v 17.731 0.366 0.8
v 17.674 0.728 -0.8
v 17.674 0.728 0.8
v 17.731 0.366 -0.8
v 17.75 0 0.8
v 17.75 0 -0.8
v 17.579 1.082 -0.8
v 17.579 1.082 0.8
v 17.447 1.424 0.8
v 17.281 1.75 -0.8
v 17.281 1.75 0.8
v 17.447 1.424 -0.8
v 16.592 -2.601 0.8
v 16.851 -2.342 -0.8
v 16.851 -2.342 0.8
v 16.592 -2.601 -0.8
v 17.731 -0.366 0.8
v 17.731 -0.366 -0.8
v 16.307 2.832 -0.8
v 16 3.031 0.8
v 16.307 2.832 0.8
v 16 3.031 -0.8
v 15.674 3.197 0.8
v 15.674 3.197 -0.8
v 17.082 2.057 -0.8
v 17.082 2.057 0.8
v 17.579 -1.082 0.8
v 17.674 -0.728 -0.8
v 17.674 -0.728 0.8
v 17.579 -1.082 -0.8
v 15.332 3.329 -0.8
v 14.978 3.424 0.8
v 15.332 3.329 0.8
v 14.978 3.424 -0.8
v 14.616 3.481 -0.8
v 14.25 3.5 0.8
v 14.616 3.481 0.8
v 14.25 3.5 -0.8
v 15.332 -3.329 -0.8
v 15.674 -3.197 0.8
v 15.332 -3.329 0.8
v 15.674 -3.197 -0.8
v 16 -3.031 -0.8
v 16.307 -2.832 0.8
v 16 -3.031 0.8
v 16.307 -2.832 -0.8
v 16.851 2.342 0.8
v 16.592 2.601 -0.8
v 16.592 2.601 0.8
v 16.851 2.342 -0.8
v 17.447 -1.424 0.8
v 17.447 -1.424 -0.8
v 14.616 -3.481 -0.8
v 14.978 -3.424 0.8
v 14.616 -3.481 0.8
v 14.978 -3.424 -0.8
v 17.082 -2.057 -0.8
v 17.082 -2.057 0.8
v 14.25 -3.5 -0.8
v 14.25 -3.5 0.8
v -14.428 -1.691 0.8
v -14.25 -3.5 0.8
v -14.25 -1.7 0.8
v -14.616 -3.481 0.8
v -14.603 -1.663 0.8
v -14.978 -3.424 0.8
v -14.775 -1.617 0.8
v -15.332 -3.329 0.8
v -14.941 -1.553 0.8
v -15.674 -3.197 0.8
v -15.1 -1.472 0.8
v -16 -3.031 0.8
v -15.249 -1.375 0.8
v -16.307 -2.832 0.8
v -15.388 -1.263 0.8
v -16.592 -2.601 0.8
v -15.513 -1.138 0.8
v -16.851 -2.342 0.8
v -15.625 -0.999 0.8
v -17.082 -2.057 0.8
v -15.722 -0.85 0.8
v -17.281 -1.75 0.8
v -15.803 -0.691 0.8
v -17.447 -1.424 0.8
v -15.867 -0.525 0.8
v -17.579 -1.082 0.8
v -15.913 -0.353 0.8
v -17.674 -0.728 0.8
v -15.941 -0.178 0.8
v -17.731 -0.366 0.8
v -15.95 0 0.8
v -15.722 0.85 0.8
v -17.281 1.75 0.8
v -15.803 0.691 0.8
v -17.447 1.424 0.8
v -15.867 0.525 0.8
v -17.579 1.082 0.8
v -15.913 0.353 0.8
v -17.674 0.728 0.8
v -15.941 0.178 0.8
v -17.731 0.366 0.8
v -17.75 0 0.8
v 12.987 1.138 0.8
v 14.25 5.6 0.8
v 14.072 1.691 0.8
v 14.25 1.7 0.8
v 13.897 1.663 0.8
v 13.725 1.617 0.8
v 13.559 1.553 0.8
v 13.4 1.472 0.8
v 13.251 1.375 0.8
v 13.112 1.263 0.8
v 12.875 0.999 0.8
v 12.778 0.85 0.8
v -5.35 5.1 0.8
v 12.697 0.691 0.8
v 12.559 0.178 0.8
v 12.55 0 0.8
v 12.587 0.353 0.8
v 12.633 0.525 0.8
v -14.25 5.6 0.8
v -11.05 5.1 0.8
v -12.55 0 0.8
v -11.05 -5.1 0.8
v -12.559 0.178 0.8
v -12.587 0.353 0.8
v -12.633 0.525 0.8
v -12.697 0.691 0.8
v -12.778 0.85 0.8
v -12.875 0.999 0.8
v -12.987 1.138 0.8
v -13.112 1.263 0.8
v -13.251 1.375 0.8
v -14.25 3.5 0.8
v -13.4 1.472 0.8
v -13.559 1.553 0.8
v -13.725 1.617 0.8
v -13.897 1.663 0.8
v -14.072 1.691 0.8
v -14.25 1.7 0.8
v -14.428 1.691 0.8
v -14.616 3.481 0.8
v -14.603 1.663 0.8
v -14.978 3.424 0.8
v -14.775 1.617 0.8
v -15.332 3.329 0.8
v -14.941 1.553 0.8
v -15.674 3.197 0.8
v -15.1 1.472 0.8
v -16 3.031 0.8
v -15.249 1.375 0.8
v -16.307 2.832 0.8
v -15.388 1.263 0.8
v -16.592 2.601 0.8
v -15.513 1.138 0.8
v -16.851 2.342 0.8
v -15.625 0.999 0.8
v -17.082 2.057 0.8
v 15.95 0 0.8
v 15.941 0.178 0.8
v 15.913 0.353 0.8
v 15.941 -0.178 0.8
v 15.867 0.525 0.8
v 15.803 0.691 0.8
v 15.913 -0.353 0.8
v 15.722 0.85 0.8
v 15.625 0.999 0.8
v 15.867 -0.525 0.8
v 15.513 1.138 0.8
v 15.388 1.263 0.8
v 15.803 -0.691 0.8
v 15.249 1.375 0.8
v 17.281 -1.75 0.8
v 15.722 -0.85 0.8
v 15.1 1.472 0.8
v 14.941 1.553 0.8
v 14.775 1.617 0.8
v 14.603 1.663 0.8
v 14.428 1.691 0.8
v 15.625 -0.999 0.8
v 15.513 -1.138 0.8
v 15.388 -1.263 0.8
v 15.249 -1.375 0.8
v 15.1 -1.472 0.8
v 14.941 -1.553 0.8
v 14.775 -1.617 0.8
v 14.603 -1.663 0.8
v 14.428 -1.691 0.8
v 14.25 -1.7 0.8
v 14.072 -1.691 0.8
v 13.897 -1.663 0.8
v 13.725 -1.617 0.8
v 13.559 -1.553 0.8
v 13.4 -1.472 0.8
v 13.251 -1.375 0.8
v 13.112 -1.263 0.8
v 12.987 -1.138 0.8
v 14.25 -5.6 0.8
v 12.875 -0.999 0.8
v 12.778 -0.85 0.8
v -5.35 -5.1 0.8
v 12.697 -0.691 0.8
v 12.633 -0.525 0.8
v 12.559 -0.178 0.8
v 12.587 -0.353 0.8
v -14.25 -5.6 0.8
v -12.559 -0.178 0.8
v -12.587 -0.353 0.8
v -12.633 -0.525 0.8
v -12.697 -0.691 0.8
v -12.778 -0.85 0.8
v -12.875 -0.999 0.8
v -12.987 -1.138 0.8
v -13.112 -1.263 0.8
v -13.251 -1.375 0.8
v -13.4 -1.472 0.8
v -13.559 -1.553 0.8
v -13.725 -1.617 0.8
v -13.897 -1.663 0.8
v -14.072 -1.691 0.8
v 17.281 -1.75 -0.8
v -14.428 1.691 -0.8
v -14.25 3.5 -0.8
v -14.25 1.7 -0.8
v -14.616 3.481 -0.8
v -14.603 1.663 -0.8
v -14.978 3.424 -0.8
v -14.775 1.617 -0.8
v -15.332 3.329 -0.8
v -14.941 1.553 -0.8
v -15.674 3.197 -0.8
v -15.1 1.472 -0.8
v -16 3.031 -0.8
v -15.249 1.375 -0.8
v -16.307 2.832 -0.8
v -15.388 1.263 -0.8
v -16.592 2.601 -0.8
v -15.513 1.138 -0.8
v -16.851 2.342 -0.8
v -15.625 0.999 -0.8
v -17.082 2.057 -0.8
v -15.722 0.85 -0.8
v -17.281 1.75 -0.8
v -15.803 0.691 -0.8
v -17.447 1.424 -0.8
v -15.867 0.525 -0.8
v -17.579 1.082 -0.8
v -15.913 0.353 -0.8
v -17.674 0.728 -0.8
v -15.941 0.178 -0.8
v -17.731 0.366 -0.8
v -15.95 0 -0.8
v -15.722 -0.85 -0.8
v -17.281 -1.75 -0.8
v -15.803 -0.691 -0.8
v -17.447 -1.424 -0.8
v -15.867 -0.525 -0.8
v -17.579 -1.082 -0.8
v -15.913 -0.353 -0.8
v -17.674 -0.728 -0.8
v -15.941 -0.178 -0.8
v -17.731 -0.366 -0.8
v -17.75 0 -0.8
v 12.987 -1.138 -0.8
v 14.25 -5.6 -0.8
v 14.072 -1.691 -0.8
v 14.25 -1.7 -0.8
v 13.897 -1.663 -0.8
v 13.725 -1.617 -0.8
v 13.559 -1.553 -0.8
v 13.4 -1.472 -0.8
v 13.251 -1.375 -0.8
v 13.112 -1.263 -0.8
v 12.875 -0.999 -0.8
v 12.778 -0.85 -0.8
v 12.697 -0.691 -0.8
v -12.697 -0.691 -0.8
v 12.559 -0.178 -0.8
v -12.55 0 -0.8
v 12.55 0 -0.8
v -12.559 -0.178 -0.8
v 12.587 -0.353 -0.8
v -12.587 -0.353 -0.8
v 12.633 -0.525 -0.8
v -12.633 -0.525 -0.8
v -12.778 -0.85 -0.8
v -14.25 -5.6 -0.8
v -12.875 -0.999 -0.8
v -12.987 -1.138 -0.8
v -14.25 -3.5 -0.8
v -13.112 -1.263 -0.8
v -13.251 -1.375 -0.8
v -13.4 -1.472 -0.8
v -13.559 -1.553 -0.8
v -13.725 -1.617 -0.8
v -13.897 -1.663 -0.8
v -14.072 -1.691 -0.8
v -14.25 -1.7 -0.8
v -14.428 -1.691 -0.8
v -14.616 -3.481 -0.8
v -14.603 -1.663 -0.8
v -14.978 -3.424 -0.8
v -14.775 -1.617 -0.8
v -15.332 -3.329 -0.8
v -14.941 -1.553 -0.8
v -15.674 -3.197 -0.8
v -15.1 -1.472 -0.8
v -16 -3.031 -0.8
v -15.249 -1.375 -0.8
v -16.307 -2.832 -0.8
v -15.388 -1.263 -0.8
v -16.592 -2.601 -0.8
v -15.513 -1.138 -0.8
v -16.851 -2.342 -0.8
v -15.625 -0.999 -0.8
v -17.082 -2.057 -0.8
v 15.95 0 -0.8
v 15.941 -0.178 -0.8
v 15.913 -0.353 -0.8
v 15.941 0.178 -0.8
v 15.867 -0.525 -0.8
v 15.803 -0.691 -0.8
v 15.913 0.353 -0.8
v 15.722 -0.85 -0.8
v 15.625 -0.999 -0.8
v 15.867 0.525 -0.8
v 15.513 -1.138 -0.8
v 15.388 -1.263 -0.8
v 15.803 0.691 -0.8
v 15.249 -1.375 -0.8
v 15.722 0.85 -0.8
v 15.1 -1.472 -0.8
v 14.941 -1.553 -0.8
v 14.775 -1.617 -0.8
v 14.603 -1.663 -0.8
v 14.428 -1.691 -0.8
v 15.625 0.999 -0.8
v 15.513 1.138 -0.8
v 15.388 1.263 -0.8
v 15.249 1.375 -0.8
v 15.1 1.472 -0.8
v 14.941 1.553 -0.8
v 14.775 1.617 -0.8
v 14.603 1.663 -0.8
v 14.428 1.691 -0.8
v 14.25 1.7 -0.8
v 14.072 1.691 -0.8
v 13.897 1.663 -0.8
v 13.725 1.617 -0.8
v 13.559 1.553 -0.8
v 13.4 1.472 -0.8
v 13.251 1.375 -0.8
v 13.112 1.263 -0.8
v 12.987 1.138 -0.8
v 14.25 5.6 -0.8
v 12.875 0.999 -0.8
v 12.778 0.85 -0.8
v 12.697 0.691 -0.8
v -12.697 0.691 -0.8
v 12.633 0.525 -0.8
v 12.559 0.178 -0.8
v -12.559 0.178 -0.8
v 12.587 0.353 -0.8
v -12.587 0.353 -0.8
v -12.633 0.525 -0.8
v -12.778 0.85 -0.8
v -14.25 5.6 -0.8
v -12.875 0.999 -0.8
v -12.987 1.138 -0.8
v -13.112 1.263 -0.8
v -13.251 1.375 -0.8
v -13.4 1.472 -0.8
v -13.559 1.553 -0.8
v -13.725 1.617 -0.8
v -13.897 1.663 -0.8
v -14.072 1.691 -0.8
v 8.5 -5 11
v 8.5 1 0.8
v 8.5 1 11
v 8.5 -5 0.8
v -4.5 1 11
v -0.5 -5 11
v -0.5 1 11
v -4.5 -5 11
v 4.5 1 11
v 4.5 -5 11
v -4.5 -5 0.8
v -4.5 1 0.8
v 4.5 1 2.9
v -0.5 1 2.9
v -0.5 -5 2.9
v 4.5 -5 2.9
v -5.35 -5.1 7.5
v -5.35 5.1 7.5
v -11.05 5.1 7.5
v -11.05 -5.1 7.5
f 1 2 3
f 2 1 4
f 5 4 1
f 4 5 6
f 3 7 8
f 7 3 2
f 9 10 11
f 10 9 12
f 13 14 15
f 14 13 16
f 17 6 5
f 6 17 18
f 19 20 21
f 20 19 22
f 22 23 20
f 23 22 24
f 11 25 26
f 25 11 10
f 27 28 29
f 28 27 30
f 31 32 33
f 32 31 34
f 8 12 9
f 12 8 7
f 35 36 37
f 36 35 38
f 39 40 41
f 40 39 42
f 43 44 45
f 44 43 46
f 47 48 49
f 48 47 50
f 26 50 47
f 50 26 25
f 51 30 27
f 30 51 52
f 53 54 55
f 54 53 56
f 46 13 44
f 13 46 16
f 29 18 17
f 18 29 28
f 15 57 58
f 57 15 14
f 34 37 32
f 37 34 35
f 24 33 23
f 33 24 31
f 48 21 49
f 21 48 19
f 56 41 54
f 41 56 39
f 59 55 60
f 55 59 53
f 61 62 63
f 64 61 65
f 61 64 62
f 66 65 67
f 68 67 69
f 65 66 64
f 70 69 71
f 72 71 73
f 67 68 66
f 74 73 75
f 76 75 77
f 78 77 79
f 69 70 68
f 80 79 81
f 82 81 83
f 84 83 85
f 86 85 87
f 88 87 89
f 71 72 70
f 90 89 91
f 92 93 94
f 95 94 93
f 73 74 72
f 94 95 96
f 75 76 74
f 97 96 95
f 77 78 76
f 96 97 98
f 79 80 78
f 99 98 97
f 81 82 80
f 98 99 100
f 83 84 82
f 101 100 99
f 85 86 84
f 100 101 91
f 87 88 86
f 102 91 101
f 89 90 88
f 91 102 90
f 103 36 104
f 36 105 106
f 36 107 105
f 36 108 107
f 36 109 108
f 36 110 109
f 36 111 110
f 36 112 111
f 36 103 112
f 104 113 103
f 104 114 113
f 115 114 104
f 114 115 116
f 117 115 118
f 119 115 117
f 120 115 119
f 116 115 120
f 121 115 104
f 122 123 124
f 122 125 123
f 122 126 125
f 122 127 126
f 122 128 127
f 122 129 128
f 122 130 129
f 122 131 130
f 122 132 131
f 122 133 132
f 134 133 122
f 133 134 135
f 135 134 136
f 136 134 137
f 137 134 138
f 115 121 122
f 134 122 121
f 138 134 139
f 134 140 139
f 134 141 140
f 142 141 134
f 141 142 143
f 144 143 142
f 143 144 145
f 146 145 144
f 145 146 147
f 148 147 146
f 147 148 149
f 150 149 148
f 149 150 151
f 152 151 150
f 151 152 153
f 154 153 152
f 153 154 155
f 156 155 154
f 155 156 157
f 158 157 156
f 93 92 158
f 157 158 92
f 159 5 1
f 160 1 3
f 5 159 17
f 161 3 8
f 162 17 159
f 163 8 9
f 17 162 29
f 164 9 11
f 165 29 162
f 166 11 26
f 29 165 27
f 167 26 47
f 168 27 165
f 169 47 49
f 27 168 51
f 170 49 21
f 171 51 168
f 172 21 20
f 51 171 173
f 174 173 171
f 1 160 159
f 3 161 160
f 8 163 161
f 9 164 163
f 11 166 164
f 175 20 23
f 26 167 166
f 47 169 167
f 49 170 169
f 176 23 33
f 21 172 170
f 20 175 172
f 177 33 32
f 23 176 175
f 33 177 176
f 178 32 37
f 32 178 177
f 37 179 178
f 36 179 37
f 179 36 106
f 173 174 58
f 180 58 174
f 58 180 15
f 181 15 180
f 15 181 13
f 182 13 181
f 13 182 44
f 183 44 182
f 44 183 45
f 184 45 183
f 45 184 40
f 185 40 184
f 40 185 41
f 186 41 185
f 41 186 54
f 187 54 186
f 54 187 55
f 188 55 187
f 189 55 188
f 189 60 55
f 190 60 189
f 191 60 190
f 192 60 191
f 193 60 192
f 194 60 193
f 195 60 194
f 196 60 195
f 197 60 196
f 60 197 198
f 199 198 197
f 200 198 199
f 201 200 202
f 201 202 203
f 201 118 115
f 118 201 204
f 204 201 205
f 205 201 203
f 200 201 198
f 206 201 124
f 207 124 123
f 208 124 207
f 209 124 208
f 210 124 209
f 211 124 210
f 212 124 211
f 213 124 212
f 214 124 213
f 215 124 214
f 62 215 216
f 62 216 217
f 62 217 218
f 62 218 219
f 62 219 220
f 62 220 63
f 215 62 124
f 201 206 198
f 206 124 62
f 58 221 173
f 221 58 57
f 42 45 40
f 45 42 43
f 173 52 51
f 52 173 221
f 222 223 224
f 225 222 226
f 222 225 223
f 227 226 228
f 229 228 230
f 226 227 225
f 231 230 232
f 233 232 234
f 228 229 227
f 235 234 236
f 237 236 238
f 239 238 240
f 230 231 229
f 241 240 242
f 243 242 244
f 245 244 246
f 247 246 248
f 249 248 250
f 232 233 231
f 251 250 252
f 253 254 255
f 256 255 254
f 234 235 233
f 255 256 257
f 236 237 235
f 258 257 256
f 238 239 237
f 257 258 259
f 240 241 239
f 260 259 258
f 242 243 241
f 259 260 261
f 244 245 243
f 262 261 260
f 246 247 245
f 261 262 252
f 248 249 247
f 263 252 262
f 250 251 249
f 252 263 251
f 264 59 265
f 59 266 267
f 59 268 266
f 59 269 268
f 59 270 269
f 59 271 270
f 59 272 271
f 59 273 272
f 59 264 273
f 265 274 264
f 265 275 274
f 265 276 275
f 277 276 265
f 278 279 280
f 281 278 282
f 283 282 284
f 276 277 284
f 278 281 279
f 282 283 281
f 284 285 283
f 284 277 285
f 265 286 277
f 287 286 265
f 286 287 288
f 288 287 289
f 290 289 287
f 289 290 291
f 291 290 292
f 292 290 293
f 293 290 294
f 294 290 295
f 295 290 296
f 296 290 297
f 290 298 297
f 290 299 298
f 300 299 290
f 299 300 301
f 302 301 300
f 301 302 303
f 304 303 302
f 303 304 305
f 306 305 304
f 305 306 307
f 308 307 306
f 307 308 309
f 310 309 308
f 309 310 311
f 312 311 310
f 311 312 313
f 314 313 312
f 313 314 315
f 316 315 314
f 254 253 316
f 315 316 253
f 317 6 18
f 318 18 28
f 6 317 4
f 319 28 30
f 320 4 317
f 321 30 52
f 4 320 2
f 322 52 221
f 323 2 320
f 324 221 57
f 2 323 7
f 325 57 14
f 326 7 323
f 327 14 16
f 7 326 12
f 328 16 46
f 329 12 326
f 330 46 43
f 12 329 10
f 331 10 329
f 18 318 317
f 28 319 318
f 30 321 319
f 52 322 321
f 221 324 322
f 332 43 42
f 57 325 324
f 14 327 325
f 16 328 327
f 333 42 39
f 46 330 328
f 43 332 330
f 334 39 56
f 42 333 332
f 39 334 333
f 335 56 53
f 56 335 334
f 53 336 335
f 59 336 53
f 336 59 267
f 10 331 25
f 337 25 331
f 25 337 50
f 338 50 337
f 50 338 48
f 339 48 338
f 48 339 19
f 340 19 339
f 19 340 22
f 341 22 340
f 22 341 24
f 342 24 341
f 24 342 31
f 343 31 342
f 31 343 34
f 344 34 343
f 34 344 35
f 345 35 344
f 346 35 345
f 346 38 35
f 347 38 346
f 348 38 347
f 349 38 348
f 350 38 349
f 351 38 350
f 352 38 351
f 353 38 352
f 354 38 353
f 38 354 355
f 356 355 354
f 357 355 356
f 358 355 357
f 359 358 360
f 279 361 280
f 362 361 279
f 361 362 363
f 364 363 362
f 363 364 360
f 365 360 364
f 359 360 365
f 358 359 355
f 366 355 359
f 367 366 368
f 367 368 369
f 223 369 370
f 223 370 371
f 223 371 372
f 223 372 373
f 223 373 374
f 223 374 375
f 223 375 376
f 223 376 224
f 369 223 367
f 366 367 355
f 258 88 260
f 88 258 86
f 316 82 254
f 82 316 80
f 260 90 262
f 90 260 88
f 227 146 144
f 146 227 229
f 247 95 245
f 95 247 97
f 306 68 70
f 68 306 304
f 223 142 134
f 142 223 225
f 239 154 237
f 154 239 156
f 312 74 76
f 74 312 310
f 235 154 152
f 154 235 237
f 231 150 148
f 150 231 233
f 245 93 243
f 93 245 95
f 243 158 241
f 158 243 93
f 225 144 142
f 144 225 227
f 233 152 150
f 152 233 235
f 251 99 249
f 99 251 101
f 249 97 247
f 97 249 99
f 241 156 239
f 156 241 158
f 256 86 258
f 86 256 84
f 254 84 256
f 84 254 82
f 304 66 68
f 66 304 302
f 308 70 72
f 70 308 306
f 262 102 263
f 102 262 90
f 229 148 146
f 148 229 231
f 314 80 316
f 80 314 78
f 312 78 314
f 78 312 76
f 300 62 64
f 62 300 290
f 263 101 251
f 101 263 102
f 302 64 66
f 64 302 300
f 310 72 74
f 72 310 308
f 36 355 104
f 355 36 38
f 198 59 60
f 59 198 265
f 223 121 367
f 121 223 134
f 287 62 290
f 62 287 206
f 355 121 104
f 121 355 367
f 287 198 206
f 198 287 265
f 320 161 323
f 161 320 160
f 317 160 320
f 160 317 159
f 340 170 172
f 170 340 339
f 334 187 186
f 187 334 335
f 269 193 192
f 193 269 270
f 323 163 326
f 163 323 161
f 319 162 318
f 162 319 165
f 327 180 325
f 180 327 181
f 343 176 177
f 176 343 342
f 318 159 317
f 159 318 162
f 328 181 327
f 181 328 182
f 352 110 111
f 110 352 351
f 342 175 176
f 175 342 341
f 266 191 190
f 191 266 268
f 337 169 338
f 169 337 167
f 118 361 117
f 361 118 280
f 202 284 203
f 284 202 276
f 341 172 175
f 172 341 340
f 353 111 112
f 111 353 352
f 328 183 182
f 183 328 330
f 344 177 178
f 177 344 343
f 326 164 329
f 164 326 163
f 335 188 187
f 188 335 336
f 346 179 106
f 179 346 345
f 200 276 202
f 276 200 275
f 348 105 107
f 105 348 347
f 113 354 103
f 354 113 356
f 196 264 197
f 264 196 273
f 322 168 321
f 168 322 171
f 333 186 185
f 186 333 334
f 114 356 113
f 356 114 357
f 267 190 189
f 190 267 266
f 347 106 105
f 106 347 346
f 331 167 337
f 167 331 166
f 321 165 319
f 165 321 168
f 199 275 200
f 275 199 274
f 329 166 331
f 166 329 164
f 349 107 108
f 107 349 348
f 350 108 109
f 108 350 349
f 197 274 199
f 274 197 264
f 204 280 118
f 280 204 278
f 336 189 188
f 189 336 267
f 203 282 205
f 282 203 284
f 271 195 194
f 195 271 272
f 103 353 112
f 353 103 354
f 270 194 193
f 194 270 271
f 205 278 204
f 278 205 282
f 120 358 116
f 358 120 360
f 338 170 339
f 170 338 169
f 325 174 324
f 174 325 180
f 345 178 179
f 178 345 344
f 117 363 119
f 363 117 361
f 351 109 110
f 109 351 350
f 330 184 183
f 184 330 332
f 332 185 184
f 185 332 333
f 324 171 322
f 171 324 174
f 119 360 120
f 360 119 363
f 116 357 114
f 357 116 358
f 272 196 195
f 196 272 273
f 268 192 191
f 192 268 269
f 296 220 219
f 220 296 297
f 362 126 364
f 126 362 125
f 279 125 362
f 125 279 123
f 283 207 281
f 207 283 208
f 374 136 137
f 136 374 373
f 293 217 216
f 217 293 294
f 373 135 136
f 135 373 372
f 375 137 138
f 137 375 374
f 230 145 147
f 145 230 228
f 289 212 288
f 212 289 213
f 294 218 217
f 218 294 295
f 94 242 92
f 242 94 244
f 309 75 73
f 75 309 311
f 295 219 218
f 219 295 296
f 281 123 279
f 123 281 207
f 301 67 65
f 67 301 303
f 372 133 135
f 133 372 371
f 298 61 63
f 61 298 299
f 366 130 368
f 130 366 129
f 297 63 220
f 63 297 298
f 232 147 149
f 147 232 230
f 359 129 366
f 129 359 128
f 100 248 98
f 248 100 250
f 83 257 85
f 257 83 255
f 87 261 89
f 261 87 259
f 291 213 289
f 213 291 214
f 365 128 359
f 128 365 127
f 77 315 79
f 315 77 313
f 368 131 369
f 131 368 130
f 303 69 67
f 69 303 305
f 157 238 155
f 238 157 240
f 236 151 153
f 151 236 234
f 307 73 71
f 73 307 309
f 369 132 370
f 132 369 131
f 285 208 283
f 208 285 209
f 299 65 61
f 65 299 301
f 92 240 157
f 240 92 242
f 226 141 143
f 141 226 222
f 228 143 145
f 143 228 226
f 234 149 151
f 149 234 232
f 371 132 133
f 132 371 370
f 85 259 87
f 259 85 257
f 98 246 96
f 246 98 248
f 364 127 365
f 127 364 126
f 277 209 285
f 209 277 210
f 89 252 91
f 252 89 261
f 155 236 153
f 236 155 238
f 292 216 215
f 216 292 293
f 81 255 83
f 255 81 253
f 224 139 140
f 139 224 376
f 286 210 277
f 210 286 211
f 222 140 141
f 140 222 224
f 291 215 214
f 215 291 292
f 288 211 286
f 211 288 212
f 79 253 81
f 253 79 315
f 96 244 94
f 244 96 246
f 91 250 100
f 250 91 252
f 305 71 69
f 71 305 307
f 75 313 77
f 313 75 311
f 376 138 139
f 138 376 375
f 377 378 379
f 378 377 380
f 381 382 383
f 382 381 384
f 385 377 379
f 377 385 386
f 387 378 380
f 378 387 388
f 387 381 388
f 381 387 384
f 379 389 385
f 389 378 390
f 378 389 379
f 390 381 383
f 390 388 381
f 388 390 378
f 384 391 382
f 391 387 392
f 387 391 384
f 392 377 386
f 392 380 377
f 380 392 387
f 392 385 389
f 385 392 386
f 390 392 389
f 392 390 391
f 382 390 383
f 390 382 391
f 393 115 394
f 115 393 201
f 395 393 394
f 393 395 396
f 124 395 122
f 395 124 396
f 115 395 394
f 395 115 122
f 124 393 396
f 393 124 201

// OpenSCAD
 
$fn=60;

screwCutout = 4;

blockHeigth = 24;
blockWidth = 9;
blockLength = 18;

holeSepertation = 8;

boardBoxWidth = 28.5;
boardBoxDepth = 11.2;
boardBoxz = 1.6;
boardBoxWidthHoleBorder = 7;
boardBoxWidthHole = 3.4;



BoardBock();

module BoardBock(){
	boardPlugWidth = 5.7;
	boardPlugDepth = 10.2;
	boardPlugZ = 6.7;

	boardOptoWidth = 13;
	boardOptoDepth = 6;
	boardOptoZ = 10.2;

	difference(){
		union(){
			cube([boardBoxWidth,boardBoxDepth,boardBoxz],center=true);  // Board
//			translate([0,0,-boardBoxz])
//				cube([boardBoxWidth-4.3,boardBoxDepth-1,2],center=true);	// Spacer for Pins
			for(a = [1,-1]){
				translate([(a * (boardBoxWidth/2)),0,0])
					cylinder(h=boardBoxz,d=boardBoxWidthHoleBorder,center=true);	// Outside Hole
			}
		}
		for(a = [1,-1]){
			translate([(a * (boardBoxWidth/2)),0,0])
				cylinder(h=boardBoxz+.1,d=boardBoxWidthHole,center=true);	// Hole
		}
	}
	
	translate([-8.2,0,(boardPlugZ/2)+(boardBoxz/2)])
		cube([boardPlugWidth,boardPlugDepth,boardPlugZ],center=true);		// PlugBlock
	
	translate([2,-2,(boardOptoZ/2)+(boardBoxz/2)])
		difference(){
			cube([boardOptoWidth,boardOptoDepth,boardOptoZ],center=true);		// PlugBlock
			translate([0,0,+1.1])
				cube([5,boardOptoDepth+1,8.2],center=true);		// PlugBlock
		}
}

module aa(){
	difference(){
	//	plate2Point(blockLength,blockHeigth,blockWidth);
		plate4Point(blockWidth,blockLength,blockHeigth,6);
		for(a = [1,-1]){
			translate([.5,(a * (holeSepertation/2))+1,0])
				cylinder(h=blockHeigth+5,d=screwCutout,center=true);
		}
		translate([blockWidth/2,0,0])
			cylinder(h=blockHeigth+5,d=2,center=true);
	}
}
////////////////////////////////////////////////////////////////////////////////////////////////////
module plate2Point(y,z,d){
	hull(){
		color("green") translate([0 ,(y/2) -(d/2),0]) cylinder(h=z, d=d, center=true);
		color("blue")  translate([0 ,-(y/2)+(d/2),0]) cylinder(h=z, d=d, center=true);
	}
}
////////////////////////////////////////////////////////////////////////////////////////////////////
module plate4Point(x,y,z,d){
	hull(){
		color("green") translate([(x/2)-(d/2) ,(y/2) -(d/2),0]) cylinder(h=z, d=d, center=true);
		color("blue")  translate([(x/2)-(d/2) ,-(y/2)+(d/2),0]) cylinder(h=z, d=d, center=true);
		color("red")   translate([-(x/2)+(d/2),(y/2) -(d/2),0]) cylinder(h=z, d=d, center=true);
		color("grey")  translate([-(x/2)+(d/2),-(y/2)+(d/2),0]) cylinder(h=z, d=d, center=true);
	}
}
